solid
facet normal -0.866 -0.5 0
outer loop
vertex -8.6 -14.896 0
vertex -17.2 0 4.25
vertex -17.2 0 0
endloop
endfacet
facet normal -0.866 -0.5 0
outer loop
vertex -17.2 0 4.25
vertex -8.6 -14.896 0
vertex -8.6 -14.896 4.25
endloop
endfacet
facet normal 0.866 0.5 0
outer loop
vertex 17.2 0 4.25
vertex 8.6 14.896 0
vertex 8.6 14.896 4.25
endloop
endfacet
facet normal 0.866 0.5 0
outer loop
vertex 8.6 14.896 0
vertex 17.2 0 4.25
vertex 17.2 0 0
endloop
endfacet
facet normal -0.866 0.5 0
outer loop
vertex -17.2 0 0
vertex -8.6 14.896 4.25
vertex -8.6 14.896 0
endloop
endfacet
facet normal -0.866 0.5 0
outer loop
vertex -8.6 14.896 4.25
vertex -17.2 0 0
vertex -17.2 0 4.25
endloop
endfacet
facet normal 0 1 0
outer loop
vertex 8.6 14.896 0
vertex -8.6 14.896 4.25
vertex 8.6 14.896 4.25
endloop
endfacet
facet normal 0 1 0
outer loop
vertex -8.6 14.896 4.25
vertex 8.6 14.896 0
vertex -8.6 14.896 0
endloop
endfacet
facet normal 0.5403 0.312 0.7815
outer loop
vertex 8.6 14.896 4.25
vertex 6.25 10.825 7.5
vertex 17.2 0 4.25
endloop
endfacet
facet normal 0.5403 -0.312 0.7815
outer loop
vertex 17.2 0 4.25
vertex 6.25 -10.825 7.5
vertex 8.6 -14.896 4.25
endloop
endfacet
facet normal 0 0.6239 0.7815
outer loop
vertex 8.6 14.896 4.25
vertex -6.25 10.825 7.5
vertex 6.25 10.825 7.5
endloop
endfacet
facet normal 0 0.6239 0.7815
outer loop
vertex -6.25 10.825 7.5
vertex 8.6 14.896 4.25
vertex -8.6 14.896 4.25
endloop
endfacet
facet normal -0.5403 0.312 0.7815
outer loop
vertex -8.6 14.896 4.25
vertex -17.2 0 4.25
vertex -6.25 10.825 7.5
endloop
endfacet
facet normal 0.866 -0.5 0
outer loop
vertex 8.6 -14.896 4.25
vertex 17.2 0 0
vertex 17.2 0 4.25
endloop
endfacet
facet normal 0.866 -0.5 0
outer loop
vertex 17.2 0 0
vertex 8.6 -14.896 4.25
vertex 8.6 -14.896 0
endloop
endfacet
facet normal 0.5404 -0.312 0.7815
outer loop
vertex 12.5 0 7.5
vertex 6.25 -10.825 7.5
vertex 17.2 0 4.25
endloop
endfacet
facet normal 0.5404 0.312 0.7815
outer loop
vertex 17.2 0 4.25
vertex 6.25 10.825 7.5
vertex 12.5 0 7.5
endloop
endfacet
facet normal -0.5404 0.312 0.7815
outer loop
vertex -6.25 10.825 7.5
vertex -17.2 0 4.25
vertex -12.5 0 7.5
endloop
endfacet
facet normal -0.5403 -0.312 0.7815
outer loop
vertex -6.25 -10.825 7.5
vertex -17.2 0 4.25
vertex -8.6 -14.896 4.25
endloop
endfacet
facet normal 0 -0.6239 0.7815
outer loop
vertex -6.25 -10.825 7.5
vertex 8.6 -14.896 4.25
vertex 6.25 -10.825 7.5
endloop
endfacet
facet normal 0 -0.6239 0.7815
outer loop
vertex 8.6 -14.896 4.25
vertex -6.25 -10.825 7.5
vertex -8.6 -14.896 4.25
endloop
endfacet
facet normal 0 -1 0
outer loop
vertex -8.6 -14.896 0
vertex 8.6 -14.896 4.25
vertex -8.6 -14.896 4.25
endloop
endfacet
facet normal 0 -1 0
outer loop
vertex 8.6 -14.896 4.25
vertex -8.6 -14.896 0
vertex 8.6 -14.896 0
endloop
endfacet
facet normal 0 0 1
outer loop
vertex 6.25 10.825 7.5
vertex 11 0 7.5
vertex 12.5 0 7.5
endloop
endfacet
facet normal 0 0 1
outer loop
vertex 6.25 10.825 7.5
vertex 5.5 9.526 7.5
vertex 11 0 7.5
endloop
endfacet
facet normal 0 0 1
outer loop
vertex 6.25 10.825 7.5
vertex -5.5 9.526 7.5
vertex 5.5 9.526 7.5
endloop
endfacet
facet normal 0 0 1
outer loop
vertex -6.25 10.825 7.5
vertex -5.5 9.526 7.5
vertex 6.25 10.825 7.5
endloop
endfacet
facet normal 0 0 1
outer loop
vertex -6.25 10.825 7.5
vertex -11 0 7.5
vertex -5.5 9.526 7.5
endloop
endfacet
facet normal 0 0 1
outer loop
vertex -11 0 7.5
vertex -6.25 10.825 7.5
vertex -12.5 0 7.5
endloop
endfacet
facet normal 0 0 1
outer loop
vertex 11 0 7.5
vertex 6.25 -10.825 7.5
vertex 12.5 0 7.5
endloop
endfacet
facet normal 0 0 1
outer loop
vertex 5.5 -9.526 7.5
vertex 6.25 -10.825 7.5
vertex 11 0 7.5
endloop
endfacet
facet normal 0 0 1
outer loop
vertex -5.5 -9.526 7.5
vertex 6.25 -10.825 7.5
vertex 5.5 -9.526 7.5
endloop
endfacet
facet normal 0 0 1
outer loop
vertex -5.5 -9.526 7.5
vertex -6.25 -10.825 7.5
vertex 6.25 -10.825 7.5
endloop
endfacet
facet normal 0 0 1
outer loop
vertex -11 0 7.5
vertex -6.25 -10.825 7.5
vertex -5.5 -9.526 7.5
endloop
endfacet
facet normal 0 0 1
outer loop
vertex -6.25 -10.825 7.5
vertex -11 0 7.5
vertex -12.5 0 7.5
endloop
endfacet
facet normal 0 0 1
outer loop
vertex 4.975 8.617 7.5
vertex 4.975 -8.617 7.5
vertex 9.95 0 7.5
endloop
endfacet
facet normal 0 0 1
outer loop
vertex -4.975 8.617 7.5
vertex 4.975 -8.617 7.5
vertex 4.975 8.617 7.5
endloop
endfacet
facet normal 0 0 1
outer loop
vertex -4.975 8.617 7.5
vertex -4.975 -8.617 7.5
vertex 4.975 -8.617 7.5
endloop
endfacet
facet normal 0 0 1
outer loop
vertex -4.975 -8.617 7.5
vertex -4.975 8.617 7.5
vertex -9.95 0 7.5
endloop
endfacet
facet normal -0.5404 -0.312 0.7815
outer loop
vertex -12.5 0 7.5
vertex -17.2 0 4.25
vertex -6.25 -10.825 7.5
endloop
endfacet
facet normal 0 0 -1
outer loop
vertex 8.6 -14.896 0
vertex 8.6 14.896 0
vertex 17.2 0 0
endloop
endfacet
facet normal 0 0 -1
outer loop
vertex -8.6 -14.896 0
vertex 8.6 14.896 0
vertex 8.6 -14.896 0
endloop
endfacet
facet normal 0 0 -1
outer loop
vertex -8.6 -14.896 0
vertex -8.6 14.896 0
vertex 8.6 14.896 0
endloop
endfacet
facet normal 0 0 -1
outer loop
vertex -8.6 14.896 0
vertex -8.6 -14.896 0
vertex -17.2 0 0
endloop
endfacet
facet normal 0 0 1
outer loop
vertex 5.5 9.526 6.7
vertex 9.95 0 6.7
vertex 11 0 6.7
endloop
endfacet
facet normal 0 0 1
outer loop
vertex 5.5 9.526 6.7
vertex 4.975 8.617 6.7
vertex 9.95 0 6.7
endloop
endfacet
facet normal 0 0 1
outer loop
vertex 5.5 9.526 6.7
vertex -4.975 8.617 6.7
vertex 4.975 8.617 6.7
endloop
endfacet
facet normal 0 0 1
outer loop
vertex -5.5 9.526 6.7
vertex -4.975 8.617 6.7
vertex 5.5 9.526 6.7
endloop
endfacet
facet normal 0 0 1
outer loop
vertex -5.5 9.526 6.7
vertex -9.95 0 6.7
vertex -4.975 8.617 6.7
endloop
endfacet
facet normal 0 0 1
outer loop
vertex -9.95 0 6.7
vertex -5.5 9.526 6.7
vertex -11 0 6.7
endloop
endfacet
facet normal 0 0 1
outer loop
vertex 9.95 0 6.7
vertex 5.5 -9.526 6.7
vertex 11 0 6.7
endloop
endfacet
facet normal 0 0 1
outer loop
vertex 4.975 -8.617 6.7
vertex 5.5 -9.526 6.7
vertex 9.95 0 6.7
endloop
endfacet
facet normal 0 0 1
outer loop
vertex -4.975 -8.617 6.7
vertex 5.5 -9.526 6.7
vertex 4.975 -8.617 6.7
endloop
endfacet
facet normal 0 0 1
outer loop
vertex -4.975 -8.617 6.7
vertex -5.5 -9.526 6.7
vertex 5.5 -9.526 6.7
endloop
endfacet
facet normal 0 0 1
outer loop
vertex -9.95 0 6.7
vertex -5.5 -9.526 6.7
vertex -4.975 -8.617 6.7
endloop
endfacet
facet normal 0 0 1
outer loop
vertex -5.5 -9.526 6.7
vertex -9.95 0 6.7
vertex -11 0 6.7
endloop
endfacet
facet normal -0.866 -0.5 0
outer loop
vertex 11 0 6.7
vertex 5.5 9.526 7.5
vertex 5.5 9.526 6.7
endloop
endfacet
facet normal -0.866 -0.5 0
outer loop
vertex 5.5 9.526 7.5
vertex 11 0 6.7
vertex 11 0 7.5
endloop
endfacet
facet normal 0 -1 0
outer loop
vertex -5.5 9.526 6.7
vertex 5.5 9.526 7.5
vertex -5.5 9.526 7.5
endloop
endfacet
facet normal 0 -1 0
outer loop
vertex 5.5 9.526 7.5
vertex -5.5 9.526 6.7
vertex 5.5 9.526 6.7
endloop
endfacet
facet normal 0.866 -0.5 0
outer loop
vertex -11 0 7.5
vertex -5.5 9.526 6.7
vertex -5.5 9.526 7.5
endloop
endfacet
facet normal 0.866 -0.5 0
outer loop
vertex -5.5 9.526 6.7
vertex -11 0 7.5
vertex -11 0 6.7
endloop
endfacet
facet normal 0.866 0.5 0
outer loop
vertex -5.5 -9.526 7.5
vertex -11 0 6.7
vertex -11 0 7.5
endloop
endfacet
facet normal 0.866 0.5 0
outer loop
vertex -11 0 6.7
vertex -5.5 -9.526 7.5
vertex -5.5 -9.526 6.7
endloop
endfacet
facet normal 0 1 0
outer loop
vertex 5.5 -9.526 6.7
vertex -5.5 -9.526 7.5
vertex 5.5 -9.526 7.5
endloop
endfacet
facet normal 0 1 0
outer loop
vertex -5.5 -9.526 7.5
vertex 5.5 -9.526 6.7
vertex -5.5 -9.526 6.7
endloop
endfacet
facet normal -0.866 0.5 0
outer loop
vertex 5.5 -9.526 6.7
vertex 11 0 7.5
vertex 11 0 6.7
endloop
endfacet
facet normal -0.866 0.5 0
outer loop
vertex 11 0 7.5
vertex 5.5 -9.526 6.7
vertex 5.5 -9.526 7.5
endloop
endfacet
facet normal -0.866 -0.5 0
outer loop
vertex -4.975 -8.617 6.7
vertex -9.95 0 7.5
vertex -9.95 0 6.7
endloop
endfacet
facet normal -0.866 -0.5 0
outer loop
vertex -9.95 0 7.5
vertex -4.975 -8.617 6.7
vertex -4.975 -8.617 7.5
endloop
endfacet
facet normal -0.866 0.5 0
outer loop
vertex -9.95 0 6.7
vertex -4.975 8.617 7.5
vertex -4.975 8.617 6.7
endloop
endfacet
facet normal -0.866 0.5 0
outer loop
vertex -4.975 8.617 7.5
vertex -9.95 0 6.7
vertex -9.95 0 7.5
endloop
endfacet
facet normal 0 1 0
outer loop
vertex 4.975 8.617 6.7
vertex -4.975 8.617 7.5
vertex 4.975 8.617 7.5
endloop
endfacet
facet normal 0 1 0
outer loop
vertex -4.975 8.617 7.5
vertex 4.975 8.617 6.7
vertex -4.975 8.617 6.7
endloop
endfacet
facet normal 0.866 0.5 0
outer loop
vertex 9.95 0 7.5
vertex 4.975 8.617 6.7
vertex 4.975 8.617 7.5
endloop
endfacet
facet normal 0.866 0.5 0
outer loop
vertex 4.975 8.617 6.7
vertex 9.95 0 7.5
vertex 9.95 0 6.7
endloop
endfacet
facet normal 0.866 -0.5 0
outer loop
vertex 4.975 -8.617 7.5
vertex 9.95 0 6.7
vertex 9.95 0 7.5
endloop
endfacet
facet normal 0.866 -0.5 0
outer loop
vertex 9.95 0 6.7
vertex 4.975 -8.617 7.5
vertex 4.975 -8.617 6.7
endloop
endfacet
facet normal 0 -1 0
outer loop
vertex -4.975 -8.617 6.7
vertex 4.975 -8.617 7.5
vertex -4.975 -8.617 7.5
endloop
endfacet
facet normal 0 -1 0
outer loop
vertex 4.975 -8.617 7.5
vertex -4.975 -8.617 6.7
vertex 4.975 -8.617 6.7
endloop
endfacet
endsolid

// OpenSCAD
$fn = 6;

module ext(h) {
  translate([0, 0, -h/2])
  linear_extrude(h)
  children();
}

module setting() {
  difference() {
    hull() {
      ext(3) circle(d=45);
      ext(10) circle(d=40.2);
    }
    linear_extrude(20) circle(d=35);
  }
}

module gem() {
  slack = 0.6;
  h = 15;
  
  difference() {
    hull() {
      ext(8.5) circle(d=35-slack);
      ext(h) circle(d=25);
    }

    translate([0, 0, -25])
    cube(50, center=true);
    
    translate([0, 0, h/2-0.8])
    linear_extrude(2)
    difference() {
      circle(d=22);
      circle(d=19.9);
    }
  }
}

gem();
